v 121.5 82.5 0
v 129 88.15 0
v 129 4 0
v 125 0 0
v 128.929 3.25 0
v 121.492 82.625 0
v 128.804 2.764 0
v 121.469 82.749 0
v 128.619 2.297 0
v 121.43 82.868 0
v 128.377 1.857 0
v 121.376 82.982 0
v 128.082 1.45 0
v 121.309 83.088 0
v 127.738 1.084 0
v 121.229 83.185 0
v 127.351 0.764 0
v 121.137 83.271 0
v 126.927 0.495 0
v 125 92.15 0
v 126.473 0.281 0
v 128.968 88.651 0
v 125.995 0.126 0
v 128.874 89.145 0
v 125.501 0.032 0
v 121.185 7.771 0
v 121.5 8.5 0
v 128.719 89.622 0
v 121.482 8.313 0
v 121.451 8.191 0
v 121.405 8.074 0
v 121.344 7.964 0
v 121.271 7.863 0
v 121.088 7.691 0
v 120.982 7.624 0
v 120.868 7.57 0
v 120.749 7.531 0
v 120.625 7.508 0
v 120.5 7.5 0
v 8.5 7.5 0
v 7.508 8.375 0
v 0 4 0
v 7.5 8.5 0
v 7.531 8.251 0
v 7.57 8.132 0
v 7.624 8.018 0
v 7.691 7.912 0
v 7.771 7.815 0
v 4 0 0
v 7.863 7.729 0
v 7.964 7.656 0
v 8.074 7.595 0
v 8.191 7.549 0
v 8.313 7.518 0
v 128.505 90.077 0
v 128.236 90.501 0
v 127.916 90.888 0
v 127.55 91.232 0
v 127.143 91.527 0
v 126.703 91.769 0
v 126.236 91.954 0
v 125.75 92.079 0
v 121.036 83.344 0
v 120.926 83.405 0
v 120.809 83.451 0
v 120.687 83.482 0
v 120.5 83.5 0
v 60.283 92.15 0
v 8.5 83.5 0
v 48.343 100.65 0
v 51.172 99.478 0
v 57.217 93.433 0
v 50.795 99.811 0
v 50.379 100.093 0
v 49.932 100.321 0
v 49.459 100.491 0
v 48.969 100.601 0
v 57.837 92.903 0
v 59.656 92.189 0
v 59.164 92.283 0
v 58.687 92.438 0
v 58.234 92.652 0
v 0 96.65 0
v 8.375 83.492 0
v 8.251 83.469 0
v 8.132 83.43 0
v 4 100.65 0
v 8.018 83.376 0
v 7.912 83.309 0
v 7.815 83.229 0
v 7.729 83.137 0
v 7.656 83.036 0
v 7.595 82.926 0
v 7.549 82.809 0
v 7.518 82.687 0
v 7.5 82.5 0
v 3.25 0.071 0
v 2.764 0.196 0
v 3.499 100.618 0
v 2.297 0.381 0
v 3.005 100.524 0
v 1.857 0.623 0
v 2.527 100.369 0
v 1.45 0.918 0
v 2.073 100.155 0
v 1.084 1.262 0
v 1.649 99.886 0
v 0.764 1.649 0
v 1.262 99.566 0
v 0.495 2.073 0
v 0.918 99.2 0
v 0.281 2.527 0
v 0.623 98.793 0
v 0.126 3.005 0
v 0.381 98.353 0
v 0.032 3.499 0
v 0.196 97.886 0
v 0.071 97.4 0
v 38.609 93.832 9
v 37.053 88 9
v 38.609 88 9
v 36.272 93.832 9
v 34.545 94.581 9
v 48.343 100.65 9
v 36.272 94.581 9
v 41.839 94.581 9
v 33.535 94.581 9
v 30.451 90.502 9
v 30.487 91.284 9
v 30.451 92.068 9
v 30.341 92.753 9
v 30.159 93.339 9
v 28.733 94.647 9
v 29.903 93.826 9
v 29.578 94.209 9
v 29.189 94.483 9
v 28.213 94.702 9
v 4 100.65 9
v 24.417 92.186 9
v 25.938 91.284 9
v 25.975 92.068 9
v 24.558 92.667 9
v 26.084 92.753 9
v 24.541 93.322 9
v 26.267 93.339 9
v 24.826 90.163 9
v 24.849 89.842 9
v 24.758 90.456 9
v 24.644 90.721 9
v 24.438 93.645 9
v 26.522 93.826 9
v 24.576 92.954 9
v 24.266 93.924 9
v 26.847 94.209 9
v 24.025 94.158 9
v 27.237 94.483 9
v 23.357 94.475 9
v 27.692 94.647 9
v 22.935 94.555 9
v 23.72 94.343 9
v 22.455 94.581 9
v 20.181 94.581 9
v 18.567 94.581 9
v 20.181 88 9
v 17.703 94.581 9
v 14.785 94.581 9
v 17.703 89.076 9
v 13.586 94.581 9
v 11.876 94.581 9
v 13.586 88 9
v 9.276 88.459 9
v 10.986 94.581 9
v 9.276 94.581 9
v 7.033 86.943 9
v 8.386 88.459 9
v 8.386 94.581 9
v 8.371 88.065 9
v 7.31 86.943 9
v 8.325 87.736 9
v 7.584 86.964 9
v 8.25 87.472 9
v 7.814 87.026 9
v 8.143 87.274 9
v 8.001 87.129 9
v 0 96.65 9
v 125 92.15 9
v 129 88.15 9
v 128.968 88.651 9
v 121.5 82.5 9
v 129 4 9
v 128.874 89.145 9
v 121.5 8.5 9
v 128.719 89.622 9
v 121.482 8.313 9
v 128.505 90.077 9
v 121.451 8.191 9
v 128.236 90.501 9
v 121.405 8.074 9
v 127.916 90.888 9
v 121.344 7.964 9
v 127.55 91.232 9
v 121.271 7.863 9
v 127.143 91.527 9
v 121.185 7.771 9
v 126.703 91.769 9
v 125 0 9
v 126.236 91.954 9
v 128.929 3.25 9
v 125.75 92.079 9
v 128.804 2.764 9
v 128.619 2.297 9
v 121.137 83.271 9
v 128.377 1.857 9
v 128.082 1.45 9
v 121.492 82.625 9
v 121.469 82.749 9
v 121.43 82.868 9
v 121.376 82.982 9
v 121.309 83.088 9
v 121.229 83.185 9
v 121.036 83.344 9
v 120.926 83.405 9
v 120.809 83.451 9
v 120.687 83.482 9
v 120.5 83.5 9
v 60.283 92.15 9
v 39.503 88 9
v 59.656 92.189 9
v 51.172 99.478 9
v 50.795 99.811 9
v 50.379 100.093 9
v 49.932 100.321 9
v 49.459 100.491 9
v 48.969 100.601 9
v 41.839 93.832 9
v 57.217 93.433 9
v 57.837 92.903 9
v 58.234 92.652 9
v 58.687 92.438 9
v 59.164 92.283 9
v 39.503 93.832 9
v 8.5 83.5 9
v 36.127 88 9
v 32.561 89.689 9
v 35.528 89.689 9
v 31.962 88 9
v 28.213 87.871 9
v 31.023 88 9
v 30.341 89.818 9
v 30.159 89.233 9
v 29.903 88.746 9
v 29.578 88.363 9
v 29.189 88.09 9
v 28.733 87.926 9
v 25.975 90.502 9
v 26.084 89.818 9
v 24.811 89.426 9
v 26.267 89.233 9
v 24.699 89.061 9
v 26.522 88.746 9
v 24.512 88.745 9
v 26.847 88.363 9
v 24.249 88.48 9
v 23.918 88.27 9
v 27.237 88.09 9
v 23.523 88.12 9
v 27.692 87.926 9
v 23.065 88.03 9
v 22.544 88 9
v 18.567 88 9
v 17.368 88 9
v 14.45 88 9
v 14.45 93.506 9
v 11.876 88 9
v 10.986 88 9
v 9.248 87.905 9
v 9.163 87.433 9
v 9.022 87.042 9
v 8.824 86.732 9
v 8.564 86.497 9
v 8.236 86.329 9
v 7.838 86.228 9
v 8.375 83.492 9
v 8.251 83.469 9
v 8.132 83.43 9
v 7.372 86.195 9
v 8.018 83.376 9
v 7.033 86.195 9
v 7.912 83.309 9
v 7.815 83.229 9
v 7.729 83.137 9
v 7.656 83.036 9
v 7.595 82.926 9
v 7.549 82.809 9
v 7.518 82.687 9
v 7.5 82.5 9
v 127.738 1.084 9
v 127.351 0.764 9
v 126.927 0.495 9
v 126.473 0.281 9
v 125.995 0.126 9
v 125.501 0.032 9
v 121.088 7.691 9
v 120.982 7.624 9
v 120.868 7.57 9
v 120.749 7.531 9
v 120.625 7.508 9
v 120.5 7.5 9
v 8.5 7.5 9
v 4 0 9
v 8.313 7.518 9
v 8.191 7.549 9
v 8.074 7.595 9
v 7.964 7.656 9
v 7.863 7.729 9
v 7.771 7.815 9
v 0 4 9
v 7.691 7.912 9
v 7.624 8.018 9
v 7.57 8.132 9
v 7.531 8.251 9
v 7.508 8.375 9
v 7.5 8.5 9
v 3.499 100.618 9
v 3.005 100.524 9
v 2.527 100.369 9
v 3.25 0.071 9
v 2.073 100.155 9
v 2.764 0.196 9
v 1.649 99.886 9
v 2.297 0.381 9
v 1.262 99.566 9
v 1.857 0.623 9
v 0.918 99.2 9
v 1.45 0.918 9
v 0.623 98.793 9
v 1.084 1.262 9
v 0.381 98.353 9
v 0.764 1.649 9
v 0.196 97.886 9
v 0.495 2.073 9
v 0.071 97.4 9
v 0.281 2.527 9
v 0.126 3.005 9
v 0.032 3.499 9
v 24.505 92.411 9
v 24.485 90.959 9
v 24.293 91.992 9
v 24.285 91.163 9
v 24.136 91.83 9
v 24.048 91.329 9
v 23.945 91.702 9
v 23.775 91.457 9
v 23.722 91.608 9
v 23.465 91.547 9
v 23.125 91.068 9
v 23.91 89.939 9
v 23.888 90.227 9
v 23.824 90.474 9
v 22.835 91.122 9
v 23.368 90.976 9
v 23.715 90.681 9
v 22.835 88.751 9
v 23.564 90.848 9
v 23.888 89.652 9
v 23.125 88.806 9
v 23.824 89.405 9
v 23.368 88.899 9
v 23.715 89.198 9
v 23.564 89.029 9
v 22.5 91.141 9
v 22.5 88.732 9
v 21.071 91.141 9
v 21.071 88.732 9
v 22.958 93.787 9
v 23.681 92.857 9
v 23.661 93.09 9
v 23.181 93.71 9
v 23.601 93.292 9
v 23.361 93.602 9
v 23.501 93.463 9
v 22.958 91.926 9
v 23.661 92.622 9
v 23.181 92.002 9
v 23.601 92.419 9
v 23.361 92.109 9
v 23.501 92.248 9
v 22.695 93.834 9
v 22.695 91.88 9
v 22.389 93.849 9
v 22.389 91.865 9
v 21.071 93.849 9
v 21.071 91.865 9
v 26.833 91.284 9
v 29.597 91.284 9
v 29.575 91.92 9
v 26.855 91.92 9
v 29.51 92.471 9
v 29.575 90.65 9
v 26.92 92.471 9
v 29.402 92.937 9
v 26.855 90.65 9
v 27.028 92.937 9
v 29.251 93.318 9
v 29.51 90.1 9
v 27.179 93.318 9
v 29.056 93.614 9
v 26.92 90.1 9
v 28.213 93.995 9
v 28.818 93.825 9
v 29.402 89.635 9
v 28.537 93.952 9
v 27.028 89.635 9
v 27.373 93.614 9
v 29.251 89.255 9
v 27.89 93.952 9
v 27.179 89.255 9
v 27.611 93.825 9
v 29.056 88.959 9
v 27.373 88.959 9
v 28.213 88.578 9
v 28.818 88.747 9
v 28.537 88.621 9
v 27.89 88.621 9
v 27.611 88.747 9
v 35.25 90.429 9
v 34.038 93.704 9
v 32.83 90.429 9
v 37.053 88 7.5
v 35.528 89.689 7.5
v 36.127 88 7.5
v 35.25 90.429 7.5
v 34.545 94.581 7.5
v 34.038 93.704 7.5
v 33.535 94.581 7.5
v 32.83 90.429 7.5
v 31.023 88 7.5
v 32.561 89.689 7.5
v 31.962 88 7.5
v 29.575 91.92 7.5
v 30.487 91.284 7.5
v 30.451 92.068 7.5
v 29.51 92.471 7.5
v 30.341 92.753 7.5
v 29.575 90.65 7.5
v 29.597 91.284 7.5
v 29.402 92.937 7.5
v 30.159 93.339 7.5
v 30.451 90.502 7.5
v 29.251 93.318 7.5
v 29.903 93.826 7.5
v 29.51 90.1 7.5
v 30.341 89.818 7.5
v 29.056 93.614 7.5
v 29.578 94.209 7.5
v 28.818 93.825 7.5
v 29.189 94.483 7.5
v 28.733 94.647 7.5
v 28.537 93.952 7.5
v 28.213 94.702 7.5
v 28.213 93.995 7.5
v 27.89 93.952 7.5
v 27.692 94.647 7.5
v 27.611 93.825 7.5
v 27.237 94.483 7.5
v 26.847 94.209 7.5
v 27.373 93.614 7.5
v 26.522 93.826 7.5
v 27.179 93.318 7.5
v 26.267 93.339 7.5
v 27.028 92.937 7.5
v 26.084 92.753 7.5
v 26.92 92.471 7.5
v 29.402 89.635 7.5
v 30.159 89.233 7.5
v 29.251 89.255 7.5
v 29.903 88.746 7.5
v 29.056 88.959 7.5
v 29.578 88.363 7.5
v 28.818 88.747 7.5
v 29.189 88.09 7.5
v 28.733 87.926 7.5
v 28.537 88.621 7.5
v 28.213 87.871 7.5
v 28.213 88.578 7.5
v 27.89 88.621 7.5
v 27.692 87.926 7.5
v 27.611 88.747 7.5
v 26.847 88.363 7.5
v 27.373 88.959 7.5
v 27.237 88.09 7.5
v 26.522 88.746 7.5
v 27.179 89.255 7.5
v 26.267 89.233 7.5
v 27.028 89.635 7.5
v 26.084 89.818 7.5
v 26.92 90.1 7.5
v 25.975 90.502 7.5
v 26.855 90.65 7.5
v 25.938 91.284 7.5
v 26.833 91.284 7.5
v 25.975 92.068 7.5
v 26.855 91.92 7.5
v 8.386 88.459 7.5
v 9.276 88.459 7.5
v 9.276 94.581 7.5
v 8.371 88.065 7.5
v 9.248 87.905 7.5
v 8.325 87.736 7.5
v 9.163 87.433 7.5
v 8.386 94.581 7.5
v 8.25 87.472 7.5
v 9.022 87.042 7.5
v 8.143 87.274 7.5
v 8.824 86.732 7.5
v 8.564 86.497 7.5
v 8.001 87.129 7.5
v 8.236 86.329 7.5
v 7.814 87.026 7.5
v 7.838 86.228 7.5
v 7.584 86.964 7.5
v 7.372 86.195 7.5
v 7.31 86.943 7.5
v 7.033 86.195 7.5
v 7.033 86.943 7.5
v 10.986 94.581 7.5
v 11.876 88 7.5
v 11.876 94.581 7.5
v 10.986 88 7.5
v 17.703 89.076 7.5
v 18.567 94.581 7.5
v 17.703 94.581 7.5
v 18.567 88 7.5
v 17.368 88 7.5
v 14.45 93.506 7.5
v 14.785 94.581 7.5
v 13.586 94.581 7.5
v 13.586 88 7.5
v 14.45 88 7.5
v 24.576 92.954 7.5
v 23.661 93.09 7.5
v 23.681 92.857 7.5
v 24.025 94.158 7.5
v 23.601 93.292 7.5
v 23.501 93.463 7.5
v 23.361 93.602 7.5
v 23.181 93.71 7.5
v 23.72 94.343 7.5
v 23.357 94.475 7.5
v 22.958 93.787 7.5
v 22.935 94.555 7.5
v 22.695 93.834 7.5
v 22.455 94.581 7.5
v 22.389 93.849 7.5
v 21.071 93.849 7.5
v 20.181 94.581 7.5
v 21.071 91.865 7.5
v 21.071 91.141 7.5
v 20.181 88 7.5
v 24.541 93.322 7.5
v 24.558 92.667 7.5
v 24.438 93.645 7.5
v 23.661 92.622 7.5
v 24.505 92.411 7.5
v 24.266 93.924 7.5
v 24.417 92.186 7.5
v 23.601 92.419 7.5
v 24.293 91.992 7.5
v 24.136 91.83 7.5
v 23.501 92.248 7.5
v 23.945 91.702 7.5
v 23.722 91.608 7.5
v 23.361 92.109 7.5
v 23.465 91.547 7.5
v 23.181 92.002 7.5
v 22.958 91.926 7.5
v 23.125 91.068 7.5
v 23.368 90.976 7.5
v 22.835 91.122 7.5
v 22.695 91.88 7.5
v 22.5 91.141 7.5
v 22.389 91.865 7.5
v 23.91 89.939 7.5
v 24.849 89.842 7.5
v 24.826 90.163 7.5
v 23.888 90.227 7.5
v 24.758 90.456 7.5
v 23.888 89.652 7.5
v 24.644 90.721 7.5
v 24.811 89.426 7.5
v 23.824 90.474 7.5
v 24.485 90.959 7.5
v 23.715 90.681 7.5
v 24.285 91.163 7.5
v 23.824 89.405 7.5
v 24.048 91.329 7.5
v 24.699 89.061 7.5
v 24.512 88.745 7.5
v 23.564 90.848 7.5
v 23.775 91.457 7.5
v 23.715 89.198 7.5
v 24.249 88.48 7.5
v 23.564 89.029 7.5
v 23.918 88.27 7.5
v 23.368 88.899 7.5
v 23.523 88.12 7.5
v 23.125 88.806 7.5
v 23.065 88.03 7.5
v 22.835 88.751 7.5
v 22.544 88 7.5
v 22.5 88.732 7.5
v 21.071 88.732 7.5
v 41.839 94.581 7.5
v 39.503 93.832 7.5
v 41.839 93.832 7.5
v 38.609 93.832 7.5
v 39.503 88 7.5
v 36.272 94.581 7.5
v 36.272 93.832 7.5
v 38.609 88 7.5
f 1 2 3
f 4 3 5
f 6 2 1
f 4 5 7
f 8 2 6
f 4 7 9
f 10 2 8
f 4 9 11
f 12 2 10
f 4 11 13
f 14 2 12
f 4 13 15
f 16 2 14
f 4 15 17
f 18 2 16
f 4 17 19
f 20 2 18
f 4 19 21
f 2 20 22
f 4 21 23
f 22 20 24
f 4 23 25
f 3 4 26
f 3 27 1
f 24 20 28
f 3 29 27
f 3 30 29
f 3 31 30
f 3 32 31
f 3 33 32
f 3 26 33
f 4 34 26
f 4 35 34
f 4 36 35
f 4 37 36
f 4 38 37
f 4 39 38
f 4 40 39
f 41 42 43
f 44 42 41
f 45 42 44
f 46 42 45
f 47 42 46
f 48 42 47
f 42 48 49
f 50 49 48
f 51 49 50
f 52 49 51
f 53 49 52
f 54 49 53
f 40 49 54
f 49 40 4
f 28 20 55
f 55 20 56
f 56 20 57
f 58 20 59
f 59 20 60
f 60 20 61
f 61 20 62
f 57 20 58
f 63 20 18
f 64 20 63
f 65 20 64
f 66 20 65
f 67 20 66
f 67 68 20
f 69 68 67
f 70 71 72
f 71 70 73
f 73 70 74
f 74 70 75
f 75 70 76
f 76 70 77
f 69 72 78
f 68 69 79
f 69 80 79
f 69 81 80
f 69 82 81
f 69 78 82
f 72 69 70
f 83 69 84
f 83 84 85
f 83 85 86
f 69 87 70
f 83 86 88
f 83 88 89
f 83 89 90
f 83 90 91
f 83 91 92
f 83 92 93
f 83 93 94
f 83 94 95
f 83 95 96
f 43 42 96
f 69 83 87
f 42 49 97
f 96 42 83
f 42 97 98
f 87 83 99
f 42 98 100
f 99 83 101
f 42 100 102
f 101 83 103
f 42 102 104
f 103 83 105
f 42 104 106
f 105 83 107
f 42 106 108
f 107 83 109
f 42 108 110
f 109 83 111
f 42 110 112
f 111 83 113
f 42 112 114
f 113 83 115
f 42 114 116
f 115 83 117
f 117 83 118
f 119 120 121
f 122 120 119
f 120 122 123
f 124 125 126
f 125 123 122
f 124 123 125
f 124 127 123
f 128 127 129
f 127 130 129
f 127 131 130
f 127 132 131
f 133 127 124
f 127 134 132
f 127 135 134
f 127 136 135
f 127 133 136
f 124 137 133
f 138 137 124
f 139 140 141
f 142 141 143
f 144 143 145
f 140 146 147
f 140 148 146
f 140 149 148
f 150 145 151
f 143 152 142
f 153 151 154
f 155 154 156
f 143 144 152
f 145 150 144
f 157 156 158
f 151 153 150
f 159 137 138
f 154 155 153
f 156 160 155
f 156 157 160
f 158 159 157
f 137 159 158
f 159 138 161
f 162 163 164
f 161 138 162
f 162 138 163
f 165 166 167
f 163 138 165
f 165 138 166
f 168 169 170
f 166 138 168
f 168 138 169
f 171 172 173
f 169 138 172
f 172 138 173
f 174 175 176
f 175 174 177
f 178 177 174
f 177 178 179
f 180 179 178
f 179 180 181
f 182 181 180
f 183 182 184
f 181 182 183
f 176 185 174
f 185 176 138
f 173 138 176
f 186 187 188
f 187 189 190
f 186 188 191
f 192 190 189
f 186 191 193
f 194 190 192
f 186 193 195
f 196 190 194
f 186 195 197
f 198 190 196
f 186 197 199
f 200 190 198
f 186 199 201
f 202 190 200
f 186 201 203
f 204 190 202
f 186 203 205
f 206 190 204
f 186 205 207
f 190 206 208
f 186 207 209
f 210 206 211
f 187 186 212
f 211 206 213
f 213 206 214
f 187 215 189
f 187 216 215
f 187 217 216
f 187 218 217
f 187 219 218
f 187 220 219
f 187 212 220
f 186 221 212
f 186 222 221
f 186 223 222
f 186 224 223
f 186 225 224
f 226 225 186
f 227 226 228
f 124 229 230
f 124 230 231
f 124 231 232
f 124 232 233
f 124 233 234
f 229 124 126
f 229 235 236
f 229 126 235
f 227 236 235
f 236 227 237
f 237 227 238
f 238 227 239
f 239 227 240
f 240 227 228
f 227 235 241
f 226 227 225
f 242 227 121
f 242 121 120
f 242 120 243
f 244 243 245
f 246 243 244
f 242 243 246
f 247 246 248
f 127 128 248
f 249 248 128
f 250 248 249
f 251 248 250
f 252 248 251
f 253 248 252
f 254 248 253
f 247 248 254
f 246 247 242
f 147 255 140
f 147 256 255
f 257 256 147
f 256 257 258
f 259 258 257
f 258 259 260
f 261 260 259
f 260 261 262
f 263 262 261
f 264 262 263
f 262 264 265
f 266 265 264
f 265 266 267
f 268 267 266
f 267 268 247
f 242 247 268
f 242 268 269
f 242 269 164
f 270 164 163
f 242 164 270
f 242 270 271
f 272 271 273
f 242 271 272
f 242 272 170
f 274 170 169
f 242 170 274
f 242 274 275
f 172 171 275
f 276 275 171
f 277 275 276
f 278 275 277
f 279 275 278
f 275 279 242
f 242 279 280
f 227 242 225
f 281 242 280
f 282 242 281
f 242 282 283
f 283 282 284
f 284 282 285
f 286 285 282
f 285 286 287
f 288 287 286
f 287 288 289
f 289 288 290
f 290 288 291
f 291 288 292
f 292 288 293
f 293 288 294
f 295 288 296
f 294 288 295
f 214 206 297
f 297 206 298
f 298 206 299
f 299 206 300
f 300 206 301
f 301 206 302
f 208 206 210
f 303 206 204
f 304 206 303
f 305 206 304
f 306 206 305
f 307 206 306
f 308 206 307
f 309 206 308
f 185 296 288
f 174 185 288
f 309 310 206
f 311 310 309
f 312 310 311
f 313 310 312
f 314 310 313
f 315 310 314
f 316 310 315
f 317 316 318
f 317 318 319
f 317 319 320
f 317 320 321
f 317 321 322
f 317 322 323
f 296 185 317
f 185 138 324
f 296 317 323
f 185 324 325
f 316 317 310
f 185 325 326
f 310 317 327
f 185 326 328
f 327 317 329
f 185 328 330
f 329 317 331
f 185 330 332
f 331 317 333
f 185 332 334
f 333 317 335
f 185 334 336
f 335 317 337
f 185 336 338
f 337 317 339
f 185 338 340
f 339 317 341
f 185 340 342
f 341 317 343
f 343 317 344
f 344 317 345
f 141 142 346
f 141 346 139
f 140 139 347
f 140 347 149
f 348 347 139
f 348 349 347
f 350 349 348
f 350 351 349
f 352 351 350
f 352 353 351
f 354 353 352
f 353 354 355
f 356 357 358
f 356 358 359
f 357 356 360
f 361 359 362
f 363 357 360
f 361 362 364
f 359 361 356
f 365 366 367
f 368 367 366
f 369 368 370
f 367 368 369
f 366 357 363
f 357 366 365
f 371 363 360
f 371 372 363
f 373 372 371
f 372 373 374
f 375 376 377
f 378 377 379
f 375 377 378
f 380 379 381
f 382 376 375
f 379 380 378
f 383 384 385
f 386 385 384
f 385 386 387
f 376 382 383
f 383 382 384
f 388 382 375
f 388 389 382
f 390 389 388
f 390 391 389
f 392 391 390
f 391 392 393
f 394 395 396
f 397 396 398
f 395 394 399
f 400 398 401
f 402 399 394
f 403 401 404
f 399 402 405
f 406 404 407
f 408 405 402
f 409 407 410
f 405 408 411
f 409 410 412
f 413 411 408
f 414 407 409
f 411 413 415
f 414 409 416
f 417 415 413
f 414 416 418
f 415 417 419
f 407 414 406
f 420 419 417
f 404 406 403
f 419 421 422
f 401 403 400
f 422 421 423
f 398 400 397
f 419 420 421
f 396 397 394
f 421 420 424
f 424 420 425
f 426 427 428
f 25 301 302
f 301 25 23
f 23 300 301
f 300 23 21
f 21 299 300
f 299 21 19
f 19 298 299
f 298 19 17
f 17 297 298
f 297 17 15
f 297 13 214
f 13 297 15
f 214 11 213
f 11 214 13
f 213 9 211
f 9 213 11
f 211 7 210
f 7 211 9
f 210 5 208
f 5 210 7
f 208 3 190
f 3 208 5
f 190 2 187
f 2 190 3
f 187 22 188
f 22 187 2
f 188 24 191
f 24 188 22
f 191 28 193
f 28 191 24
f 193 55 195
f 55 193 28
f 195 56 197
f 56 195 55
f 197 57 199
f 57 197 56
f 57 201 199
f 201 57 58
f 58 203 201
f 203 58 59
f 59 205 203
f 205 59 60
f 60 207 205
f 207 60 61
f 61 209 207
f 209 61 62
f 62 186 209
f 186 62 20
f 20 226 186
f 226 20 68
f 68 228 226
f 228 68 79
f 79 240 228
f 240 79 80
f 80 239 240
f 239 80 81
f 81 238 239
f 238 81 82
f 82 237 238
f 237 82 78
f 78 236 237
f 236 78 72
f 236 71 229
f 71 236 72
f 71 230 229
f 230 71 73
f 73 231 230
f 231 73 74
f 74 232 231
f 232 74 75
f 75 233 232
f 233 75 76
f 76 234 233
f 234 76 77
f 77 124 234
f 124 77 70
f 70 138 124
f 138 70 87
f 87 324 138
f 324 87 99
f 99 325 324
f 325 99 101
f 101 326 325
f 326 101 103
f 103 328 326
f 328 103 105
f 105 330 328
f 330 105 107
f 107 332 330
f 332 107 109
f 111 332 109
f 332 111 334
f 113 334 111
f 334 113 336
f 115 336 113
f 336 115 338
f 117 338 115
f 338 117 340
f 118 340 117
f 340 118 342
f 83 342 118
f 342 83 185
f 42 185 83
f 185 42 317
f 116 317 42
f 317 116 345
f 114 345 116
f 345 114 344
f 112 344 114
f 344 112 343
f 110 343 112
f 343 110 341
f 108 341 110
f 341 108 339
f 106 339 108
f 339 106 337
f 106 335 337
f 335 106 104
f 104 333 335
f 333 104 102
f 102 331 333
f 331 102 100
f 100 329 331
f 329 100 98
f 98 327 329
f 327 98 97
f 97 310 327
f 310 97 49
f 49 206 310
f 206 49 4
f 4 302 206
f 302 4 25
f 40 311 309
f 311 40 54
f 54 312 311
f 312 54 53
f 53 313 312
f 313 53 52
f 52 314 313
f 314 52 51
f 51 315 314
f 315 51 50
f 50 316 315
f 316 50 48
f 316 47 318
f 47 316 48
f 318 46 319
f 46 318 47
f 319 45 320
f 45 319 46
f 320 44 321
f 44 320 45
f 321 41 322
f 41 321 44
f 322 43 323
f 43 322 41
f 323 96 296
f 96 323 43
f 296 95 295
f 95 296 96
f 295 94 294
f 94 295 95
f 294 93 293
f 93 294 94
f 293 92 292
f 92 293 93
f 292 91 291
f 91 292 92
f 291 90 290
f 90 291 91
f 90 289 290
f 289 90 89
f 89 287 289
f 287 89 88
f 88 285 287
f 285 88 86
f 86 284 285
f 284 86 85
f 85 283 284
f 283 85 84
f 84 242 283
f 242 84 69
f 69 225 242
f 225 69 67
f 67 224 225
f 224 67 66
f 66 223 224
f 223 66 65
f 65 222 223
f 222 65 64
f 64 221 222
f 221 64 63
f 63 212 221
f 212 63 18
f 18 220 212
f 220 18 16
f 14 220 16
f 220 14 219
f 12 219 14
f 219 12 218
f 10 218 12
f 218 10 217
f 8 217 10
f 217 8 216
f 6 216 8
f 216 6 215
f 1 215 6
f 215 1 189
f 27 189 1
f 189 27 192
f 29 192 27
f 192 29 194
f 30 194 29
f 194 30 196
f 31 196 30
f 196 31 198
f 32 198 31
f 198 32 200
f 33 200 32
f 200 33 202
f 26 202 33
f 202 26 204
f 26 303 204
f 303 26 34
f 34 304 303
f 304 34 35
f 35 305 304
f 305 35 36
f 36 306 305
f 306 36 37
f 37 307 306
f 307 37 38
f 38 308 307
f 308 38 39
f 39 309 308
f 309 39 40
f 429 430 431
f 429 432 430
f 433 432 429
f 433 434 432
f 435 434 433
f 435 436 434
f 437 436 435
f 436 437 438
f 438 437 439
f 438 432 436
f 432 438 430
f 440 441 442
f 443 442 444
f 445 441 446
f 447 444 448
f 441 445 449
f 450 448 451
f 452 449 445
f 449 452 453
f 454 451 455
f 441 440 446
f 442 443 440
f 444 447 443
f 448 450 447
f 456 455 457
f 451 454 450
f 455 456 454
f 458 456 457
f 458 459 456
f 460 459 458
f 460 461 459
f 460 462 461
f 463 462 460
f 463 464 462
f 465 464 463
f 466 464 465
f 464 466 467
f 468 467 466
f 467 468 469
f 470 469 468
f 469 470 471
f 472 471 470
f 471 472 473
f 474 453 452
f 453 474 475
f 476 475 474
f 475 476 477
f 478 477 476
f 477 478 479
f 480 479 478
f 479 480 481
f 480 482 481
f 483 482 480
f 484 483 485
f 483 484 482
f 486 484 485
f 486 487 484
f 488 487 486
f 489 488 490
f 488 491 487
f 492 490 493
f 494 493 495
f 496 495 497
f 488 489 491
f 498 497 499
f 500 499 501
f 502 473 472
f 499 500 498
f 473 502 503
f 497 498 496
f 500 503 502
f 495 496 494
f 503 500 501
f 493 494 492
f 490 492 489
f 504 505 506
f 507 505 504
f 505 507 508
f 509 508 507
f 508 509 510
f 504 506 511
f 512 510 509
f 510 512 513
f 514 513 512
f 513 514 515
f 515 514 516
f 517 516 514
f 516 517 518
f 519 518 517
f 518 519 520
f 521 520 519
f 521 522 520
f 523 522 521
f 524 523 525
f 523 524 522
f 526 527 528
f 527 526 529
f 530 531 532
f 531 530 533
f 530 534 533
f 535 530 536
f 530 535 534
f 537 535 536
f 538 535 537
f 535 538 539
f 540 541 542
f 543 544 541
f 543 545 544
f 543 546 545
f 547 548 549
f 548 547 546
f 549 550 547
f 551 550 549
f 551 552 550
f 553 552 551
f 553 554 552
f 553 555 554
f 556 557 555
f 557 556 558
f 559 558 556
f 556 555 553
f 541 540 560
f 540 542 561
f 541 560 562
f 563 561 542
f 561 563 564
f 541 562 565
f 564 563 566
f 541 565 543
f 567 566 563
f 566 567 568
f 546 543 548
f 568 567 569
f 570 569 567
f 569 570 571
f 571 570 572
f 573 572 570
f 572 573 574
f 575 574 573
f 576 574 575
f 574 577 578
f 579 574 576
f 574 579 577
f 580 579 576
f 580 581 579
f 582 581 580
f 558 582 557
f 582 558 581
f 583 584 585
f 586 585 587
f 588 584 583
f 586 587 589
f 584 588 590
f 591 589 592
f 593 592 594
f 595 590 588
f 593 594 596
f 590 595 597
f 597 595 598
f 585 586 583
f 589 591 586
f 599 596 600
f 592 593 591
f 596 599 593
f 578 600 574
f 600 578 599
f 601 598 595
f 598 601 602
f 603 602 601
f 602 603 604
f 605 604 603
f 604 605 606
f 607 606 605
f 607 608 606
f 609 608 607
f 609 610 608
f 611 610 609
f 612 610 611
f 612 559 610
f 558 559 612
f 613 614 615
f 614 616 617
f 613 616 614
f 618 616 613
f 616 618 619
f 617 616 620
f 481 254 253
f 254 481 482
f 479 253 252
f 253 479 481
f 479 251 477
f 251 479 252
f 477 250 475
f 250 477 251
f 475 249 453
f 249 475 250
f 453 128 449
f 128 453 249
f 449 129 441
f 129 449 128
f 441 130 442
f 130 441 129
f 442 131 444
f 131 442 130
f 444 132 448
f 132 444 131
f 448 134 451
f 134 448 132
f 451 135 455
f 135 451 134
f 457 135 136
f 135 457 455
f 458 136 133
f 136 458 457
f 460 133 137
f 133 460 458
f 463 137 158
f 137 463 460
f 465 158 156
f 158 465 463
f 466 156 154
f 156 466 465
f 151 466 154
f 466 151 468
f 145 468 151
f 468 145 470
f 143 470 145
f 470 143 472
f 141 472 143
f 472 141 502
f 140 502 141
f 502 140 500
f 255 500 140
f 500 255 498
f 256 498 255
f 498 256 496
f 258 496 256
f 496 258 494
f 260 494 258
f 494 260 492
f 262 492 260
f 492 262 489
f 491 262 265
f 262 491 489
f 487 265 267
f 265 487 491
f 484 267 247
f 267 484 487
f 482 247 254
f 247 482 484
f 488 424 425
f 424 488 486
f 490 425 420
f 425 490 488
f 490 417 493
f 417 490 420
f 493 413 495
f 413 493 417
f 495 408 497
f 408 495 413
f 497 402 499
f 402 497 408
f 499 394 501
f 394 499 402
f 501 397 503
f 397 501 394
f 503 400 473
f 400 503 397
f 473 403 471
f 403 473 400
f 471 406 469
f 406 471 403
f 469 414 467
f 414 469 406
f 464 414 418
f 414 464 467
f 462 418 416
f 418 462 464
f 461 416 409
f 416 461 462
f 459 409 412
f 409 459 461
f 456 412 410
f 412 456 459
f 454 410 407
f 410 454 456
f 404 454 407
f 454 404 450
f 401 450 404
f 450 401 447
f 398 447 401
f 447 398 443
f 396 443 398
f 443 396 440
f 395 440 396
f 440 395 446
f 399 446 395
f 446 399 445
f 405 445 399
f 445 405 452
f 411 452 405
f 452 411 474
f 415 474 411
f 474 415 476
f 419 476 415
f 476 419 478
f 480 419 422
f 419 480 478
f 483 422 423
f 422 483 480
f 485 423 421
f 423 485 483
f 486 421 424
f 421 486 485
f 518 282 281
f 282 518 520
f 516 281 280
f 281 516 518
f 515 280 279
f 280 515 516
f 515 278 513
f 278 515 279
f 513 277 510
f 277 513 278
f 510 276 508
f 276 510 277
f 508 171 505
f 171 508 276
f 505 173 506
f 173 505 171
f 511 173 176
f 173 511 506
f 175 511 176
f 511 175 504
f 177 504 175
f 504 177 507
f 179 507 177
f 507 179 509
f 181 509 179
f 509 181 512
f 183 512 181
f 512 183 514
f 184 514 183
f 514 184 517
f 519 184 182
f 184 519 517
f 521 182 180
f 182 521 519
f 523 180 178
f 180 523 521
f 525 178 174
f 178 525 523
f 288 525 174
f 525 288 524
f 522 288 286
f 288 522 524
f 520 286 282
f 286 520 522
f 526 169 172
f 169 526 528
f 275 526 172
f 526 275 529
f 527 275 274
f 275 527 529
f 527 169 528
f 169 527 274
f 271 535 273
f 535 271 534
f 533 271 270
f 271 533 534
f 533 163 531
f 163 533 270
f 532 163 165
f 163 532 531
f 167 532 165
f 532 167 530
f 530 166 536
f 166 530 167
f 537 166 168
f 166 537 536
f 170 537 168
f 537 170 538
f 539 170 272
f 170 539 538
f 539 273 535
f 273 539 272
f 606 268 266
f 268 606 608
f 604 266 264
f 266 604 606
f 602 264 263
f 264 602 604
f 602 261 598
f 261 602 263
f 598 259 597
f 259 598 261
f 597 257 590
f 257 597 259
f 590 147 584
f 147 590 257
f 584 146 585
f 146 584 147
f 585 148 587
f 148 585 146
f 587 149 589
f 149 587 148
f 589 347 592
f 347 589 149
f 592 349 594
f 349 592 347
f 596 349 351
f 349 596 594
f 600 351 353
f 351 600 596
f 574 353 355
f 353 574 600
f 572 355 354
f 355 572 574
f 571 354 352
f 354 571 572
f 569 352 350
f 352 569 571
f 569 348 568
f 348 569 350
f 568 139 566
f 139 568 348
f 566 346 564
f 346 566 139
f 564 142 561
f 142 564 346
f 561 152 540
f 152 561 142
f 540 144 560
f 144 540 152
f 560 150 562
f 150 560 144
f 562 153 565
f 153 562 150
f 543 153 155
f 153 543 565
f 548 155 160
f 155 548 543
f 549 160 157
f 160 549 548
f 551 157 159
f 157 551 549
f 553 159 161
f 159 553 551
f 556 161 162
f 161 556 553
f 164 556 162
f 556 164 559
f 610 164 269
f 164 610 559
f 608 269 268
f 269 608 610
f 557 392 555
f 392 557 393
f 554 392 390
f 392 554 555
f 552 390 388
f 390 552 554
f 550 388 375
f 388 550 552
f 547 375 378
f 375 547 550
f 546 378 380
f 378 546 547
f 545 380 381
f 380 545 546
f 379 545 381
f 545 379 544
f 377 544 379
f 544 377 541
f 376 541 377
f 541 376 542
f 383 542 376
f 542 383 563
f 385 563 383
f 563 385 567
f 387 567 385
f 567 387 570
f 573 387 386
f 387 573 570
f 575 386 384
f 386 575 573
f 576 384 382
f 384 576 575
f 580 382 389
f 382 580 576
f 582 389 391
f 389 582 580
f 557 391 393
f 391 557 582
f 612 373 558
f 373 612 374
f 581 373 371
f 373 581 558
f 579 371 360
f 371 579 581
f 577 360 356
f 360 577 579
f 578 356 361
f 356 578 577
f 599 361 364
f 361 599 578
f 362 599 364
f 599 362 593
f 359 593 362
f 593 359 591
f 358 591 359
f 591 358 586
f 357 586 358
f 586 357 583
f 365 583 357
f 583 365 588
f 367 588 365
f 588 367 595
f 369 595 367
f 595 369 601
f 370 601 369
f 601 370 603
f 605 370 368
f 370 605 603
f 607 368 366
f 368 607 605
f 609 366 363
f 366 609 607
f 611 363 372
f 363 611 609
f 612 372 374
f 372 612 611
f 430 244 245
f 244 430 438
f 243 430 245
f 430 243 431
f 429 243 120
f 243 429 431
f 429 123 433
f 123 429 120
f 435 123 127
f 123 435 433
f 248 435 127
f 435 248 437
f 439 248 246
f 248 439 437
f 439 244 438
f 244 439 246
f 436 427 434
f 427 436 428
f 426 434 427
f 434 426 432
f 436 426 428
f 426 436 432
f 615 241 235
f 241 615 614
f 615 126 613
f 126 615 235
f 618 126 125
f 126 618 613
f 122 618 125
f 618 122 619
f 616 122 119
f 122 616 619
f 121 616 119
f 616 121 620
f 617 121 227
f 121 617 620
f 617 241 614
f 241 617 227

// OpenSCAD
key_width = 16.05;
key_spacing = key_width + 3;
rows = 3;
columns = 10;

padding = 5;

holes_x = 5;
holes_y = 3;
hole_size = 1;
corner_radius = 7;
inner_corner_radius = 2;
thickness = 3;
outer_padding = 1;
plate_thickness = 1.5;

top_padding = 8.65;
side_padding = 7.5;
plate_to_top = 7.5;

usb_width = 15;
usb_position = 0;
row_spacing = 19;

module hole() {
  circle(r=hole_size, $fs=0.1);
}

board_height = 76;
board_width = 114;
lip_size = 50;
lip_height = 8.5;

module outline () {
  union() {
    body_height = board_height+top_padding+side_padding;
    square([board_width+2*side_padding,body_height]);
    
    translate([0, body_height]) {
      square([lip_size,lip_height]);
      translate([lip_size, 0])
      polygon([[0,0], [0, lip_height], [lip_height, 0]]);
    }
  }
}

module body() {
  linear_extrude(height=10)
  outline();
}

module edged () {
minkowski()
{
  body();

hull() {
  translate([0,0,1])
rotate_extrude(convexity = 10, $fn=50)
translate([2, 0, 0])
circle(r = 2, $fn=50);
}
}
}

module logo() { 

translate([side_padding, board_height+side_padding+4.5, plate_to_top])
linear_extrude(height=5)
scale(0.65)
text("JINB0AT", font="IBM Plex Mono:style=Regular");
  
}

module inner() {
   translate([side_padding, side_padding])
  offset(1, $fn=50)
  offset(-1, $fn=50)
  square([board_width, board_height]);
}


difference() {
keyboard();
logo();
}




module layoutfile() {
    import(file="jinboat_keys.dxf");
}

module keyboard() {   
  linear_extrude(plate_to_top + plate_thickness)
    minkowski() {
      difference() {
        offset(4, $fn=50)
          offset(-8, $fn=50)
            offset(4, $fn=50)
              outline();
        
        inner();
      }
      //circle(r=1, $fn=50);
    }

  translate([side_padding-0.1, side_padding-0.3, 0])
    linear_extrude(height=plate_thickness)
      layoutfile();
}  

//layoutfile();
